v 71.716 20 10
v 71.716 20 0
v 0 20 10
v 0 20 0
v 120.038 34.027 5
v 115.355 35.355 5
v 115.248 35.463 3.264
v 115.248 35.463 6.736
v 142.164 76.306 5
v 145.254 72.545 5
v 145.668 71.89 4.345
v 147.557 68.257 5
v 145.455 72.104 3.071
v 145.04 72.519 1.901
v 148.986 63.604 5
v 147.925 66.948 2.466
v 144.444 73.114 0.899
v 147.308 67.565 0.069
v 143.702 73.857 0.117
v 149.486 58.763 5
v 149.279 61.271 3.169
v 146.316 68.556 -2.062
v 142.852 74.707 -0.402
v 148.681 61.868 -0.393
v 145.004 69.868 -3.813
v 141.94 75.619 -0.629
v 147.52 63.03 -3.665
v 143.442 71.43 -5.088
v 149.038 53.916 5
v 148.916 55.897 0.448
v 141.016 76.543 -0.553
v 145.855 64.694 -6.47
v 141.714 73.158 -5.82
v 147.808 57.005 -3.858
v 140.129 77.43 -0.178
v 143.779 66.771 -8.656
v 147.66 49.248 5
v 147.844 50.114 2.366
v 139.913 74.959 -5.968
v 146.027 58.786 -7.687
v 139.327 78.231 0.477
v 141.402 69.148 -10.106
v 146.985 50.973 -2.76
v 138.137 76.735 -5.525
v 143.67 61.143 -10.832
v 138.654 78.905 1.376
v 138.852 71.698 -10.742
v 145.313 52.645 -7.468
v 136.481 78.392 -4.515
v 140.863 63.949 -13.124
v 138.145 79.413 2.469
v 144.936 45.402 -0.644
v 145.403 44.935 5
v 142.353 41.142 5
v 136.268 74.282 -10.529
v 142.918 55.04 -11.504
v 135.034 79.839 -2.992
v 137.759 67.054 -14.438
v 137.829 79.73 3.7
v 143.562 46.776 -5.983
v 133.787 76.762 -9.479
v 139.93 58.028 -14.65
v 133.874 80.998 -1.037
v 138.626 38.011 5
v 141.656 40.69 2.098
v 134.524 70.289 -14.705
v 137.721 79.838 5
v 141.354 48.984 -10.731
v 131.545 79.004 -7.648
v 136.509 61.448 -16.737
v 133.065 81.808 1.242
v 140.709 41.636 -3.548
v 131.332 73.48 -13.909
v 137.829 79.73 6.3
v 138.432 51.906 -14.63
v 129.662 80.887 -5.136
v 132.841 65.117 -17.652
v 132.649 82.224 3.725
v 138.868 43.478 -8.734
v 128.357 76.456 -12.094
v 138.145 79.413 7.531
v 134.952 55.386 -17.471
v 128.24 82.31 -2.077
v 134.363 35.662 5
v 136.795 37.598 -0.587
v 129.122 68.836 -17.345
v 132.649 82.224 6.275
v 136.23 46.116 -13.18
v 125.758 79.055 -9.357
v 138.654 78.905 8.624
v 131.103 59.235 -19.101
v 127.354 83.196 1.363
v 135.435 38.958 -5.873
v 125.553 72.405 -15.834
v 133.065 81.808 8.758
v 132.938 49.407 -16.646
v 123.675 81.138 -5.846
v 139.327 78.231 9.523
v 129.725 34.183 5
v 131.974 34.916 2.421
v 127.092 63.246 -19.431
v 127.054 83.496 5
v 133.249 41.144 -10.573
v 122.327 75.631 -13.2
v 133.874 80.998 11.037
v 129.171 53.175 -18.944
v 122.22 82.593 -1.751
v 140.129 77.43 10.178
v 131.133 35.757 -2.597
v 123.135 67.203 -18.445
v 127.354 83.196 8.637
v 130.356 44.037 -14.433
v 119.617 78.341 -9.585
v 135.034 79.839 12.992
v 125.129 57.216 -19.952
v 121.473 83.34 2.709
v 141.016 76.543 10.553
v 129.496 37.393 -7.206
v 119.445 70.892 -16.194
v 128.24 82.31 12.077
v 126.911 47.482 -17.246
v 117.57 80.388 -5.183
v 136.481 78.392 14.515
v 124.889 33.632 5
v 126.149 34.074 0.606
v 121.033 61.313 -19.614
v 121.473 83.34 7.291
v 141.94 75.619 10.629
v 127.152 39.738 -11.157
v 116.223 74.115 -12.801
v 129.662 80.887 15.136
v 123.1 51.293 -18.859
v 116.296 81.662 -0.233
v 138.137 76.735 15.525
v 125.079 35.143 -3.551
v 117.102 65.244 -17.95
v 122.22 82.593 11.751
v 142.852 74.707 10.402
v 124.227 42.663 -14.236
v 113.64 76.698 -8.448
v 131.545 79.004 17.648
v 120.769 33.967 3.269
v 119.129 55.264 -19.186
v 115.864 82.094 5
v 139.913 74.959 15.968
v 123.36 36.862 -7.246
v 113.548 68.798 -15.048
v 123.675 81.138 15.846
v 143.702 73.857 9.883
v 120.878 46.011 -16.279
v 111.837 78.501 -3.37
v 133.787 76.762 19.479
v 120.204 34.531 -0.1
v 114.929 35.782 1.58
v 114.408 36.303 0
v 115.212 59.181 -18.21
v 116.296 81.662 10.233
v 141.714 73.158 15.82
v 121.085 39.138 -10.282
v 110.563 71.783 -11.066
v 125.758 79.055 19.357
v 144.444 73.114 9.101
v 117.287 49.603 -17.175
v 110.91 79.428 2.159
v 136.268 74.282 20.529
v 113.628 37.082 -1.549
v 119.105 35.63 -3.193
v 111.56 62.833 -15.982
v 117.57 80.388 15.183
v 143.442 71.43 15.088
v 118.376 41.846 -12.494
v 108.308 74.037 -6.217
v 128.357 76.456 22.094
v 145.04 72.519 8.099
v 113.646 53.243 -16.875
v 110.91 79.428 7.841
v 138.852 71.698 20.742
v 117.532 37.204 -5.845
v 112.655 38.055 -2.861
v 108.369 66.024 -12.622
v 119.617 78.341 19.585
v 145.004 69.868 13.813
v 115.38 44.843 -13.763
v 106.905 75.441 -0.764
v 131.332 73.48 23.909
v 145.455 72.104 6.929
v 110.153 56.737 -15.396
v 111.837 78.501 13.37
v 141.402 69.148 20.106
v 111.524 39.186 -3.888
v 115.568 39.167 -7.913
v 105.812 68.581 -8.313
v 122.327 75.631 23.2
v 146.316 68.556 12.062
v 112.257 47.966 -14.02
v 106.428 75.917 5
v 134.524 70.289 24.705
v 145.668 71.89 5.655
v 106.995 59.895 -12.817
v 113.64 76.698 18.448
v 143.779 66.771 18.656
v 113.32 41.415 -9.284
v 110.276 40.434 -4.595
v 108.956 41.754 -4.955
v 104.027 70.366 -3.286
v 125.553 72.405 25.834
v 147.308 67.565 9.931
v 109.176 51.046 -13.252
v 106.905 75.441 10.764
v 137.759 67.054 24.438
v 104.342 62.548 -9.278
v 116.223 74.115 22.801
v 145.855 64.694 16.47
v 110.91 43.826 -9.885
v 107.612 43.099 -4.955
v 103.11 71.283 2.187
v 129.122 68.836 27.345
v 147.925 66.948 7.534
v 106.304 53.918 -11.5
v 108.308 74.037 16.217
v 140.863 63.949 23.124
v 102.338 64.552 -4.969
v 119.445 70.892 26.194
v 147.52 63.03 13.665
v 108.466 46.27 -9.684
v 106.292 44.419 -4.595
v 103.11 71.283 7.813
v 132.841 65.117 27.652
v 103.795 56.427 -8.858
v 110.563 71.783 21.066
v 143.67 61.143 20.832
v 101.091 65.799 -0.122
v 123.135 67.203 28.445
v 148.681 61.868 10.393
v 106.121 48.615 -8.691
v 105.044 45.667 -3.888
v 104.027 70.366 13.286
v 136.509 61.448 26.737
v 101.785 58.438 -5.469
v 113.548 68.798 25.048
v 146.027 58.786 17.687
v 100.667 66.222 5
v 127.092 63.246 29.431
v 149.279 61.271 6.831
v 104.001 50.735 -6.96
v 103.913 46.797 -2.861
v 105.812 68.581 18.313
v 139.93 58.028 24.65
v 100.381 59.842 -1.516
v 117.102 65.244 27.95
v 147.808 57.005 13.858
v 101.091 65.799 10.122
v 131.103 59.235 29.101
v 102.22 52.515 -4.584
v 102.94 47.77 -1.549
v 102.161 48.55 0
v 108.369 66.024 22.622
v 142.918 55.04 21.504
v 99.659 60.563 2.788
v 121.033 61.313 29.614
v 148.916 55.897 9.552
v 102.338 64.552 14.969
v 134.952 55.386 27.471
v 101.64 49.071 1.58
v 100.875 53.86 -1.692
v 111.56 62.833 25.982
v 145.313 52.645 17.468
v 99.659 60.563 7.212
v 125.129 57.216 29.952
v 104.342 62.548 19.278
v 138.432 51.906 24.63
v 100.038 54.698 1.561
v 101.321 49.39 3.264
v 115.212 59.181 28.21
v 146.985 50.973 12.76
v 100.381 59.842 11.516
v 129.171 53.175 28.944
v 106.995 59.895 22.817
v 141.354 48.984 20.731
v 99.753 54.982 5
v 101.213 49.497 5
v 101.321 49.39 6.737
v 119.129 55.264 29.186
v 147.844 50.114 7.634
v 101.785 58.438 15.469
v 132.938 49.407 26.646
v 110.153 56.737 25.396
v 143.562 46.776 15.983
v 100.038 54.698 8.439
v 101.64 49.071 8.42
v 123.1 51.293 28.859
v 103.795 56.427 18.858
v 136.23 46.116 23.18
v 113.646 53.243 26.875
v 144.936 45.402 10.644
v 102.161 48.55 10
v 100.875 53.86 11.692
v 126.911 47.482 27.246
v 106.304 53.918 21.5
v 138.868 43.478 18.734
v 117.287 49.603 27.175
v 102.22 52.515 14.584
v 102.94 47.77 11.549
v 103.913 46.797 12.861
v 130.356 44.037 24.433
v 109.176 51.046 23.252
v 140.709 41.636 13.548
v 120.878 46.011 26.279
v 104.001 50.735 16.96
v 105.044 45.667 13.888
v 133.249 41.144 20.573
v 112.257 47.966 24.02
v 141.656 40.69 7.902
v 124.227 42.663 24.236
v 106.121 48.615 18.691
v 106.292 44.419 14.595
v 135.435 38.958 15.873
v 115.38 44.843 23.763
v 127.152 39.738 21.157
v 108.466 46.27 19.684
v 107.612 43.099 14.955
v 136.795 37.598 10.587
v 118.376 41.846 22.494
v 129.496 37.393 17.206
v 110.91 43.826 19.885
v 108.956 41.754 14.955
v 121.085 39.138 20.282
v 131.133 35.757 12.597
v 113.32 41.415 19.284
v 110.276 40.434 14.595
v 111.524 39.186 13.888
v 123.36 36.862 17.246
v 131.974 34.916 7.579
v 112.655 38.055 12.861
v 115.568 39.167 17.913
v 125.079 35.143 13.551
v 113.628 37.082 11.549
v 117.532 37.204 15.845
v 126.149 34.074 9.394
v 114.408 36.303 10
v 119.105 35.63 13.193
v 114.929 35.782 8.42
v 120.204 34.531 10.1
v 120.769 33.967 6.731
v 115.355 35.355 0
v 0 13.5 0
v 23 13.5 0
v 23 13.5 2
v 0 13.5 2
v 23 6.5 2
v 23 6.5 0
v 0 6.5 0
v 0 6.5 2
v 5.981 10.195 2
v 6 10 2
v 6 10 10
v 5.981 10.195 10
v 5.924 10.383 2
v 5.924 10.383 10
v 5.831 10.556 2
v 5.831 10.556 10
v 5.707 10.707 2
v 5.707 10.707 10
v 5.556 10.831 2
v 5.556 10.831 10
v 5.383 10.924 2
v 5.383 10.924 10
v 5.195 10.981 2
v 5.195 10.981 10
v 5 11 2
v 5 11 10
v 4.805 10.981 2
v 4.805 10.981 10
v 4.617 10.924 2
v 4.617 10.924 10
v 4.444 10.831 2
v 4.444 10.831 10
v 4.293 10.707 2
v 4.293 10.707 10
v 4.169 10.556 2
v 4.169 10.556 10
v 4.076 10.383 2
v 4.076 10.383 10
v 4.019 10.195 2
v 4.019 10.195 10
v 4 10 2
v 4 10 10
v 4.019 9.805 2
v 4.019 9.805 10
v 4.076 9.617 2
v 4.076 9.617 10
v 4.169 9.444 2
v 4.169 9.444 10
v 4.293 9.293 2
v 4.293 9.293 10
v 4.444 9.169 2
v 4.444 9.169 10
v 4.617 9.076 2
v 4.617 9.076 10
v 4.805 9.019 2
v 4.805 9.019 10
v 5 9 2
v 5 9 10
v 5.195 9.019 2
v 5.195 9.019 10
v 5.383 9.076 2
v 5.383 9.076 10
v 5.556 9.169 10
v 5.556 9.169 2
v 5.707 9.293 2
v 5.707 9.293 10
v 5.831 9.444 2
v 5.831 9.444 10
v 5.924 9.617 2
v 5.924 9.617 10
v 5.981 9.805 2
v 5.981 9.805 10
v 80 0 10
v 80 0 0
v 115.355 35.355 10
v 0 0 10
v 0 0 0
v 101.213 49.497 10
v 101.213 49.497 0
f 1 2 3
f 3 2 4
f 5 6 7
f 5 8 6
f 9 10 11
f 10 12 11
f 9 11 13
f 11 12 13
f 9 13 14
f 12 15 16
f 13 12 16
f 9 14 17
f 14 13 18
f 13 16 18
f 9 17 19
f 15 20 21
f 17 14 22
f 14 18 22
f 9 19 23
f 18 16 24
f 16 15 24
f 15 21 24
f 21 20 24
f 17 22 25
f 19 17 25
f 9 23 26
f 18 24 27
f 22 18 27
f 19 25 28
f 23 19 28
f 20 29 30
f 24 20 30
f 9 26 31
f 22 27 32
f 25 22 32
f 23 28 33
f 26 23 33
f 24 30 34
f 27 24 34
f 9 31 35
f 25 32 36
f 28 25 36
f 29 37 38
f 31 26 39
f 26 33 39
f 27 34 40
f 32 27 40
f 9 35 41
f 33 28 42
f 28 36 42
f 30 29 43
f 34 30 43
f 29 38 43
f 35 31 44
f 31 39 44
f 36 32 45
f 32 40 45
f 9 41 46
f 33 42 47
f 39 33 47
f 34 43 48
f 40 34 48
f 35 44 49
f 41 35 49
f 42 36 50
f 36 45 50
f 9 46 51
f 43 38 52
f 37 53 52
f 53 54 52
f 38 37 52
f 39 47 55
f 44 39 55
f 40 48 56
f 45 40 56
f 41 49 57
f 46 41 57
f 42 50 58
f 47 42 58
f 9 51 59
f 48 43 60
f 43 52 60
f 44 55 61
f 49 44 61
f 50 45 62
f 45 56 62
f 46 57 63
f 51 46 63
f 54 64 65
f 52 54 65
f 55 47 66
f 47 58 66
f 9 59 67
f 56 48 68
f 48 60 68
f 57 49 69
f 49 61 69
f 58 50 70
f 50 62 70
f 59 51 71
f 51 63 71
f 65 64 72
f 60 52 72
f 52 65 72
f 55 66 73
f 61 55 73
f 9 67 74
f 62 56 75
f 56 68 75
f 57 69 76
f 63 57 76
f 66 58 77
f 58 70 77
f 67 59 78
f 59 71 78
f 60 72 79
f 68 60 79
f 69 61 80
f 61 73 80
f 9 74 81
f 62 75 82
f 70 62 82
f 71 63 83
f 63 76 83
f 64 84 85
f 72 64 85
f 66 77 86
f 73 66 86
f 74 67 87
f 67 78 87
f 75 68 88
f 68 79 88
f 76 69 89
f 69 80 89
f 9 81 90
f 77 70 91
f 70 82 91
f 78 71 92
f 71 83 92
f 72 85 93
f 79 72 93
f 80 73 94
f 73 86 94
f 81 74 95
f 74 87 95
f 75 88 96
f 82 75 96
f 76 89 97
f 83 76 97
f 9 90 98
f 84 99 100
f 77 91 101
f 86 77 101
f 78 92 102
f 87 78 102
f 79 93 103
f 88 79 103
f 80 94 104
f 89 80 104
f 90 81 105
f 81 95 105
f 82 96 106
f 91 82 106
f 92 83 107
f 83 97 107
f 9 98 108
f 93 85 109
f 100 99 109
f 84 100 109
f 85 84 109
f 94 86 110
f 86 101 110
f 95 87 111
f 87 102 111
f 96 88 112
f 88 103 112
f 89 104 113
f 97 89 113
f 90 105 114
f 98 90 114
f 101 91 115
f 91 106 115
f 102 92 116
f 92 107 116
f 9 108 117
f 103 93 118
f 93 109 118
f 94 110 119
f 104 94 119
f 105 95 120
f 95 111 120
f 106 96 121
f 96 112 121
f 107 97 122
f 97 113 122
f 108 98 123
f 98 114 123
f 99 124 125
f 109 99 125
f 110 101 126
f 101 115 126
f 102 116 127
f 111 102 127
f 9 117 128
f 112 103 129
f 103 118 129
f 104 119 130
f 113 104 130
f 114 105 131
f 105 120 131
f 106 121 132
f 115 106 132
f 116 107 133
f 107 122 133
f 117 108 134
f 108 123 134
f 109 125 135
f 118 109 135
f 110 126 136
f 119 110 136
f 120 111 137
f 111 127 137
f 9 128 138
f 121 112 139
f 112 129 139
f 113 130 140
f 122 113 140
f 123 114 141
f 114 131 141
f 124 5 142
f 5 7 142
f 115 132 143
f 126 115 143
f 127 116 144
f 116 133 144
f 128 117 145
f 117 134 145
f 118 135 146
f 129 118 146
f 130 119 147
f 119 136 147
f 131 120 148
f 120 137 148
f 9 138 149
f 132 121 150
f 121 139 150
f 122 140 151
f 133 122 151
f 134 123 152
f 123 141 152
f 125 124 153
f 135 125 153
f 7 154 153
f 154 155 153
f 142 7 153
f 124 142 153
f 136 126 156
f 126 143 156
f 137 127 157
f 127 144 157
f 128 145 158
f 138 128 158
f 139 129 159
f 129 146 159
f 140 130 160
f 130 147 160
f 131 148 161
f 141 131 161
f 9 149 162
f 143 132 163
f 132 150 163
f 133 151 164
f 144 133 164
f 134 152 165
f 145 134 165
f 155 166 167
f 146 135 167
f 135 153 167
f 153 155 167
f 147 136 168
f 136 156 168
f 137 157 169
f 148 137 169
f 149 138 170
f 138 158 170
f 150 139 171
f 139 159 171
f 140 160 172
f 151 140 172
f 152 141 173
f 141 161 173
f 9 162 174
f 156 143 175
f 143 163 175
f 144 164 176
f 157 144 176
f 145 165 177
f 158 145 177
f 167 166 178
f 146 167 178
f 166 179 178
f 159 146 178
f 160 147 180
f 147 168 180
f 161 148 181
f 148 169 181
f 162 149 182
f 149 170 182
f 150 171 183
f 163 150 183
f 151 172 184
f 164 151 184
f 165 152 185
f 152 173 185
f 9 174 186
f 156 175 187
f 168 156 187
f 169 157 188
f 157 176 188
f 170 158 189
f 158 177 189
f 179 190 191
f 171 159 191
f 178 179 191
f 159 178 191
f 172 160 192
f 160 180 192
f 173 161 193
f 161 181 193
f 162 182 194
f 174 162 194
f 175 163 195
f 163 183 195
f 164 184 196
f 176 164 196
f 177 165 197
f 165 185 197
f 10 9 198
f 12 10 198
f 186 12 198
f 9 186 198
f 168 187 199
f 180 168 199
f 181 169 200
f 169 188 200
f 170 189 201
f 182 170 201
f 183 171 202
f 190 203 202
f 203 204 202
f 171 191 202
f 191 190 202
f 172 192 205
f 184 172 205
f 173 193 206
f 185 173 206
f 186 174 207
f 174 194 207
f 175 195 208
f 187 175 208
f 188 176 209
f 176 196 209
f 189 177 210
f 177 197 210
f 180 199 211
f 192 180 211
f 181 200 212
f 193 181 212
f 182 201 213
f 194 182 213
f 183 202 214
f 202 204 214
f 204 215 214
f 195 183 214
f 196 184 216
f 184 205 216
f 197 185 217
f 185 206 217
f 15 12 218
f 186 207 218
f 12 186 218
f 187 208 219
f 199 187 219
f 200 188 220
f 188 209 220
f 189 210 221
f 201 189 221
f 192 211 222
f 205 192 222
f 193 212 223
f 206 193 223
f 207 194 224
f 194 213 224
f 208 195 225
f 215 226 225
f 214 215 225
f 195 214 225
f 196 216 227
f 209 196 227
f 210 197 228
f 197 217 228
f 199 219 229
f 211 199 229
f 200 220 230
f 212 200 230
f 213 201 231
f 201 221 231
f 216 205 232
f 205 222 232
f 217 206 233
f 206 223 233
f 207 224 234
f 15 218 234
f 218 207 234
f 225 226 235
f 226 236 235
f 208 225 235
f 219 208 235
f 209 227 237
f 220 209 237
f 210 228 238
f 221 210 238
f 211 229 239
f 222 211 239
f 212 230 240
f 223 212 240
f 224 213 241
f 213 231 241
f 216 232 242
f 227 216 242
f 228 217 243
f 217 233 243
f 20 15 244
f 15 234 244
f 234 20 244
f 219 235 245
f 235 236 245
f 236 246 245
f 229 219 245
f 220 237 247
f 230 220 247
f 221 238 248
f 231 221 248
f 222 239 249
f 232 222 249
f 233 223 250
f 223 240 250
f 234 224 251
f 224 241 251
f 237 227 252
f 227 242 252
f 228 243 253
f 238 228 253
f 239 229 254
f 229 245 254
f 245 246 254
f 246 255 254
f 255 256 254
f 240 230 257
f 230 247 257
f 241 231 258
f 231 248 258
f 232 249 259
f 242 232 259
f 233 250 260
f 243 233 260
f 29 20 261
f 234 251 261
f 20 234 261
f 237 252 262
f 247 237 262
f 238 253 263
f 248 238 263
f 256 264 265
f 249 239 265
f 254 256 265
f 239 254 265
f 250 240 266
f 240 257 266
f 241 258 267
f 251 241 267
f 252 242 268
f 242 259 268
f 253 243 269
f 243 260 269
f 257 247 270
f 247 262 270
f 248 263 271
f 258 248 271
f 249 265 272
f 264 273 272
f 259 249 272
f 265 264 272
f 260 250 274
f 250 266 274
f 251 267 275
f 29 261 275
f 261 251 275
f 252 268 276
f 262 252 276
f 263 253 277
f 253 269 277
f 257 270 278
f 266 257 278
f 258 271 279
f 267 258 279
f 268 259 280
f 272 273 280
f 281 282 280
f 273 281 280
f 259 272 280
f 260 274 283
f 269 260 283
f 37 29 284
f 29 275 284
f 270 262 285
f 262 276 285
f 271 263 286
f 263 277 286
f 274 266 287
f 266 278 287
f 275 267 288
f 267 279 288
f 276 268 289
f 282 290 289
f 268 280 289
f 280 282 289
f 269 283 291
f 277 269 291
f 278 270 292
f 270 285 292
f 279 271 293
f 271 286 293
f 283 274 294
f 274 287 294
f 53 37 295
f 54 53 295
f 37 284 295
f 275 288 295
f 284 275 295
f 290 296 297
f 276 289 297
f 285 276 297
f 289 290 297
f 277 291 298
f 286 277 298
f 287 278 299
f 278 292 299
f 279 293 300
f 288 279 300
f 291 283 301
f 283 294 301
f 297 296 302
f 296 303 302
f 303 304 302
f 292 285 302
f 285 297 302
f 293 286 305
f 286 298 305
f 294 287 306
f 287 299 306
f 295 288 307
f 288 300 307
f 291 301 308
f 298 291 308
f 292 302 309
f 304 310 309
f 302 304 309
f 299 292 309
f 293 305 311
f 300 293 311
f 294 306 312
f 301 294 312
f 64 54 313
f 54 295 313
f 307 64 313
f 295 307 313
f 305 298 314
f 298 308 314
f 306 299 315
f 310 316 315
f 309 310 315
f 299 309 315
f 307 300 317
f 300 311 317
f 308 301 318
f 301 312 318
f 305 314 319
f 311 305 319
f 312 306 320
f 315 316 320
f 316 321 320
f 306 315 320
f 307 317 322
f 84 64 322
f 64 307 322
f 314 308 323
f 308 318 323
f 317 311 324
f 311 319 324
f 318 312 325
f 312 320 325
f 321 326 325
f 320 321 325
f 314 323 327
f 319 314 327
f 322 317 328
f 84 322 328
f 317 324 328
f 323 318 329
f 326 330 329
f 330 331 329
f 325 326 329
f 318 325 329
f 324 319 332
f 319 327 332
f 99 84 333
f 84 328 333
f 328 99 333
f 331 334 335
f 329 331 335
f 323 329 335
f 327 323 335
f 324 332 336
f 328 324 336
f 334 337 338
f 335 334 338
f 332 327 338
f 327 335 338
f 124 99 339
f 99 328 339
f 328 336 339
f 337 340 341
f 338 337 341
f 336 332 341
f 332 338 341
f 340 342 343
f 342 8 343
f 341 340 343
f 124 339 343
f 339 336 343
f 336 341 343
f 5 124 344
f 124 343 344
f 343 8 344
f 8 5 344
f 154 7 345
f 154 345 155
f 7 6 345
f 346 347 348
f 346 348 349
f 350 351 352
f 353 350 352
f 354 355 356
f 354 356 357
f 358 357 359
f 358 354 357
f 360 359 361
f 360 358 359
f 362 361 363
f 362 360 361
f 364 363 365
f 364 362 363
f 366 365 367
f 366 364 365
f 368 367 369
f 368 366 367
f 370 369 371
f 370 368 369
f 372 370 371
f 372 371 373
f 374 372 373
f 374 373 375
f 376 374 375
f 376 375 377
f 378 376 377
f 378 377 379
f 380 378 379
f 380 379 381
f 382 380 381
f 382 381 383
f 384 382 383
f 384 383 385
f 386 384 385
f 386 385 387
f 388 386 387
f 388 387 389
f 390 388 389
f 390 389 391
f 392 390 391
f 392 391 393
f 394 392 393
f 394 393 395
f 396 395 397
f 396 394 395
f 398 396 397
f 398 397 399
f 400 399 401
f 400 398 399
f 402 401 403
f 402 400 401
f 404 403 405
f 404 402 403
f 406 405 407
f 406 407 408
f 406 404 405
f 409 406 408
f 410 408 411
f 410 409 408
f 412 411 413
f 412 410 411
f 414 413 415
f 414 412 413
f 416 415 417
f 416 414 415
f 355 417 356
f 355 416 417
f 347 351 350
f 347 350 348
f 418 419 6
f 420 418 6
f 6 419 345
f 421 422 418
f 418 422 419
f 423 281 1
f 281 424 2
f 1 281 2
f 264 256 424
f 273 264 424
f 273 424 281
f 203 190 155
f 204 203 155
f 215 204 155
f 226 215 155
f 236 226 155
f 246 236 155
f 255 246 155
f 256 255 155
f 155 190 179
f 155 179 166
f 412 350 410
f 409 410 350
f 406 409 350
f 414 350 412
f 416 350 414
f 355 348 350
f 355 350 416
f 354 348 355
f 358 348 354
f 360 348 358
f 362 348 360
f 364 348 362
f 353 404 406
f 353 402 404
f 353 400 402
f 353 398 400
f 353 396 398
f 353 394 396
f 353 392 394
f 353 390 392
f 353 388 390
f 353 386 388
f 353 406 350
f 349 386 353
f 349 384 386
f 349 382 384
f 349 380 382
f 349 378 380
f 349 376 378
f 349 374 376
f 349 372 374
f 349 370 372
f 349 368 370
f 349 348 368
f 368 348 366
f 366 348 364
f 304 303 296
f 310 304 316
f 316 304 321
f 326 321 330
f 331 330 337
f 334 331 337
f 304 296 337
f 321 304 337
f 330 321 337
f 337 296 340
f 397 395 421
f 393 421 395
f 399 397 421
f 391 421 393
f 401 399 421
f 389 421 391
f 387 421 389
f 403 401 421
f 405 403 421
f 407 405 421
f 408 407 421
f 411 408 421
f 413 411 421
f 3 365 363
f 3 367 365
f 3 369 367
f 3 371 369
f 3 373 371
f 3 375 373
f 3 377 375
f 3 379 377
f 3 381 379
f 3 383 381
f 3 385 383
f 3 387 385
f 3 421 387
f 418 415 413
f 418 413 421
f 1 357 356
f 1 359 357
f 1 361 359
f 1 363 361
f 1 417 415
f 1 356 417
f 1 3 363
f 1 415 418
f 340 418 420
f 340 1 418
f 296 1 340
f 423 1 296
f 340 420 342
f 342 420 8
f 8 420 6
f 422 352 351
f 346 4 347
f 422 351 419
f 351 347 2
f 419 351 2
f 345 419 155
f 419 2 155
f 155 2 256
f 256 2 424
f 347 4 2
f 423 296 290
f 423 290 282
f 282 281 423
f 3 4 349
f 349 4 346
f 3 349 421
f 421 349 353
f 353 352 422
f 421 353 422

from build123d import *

# Parameters (mm, degrees)
SKETCH1_R           = 1
BOSS_EXTRUDE1_DEPTH = 10
SKETCH4_W           = 23
SKETCH4_H           = 7
CUT_EXTRUDE2_DEPTH  = 2


with BuildPart() as part:
    # Sketch1 → Boss-Extrude1 (new body)
    with BuildSketch(Plane.XY):
        Polygon((0, 0), (80, 0), (115.355339059, 35.355339059), (101.213203436, 49.497474683), (71.715728753, 20), (0, 20), align=None)
        with Locations((5, 10)):
            Circle(SKETCH1_R, mode=Mode.SUBTRACT)
    extrude(amount=BOSS_EXTRUDE1_DEPTH)

    # Sketch2 → Revolve2 (revolve)
    with BuildSketch(Plane.XY.offset(5)):
        with BuildLine():
            Line((108.284271247, 42.426406871), (142.163792523, 76.305928147))
            ThreePointArc((142.163792523, 76.305928147), (145.402623657, 44.93519468), (115.355339059, 35.355339059))
            Line((115.355339059, 35.355339059), (108.284271247, 42.426406871))
        make_face()
    revolve(axis=Axis((108.284271247, 42.426406871, 5), (0.7071067811865456, 0.7071067811865495, 0)))

    # Sketch4 → Cut-Extrude2 (cut)
    with BuildSketch(Plane(origin=(0, 0, 0), x_dir=(-1, 0, 0), z_dir=(0, 0, -1))):
        with Locations((-11.5, 10)):
            Rectangle(SKETCH4_W, SKETCH4_H)
    extrude(amount=-CUT_EXTRUDE2_DEPTH, mode=Mode.SUBTRACT)


solid = part.part
